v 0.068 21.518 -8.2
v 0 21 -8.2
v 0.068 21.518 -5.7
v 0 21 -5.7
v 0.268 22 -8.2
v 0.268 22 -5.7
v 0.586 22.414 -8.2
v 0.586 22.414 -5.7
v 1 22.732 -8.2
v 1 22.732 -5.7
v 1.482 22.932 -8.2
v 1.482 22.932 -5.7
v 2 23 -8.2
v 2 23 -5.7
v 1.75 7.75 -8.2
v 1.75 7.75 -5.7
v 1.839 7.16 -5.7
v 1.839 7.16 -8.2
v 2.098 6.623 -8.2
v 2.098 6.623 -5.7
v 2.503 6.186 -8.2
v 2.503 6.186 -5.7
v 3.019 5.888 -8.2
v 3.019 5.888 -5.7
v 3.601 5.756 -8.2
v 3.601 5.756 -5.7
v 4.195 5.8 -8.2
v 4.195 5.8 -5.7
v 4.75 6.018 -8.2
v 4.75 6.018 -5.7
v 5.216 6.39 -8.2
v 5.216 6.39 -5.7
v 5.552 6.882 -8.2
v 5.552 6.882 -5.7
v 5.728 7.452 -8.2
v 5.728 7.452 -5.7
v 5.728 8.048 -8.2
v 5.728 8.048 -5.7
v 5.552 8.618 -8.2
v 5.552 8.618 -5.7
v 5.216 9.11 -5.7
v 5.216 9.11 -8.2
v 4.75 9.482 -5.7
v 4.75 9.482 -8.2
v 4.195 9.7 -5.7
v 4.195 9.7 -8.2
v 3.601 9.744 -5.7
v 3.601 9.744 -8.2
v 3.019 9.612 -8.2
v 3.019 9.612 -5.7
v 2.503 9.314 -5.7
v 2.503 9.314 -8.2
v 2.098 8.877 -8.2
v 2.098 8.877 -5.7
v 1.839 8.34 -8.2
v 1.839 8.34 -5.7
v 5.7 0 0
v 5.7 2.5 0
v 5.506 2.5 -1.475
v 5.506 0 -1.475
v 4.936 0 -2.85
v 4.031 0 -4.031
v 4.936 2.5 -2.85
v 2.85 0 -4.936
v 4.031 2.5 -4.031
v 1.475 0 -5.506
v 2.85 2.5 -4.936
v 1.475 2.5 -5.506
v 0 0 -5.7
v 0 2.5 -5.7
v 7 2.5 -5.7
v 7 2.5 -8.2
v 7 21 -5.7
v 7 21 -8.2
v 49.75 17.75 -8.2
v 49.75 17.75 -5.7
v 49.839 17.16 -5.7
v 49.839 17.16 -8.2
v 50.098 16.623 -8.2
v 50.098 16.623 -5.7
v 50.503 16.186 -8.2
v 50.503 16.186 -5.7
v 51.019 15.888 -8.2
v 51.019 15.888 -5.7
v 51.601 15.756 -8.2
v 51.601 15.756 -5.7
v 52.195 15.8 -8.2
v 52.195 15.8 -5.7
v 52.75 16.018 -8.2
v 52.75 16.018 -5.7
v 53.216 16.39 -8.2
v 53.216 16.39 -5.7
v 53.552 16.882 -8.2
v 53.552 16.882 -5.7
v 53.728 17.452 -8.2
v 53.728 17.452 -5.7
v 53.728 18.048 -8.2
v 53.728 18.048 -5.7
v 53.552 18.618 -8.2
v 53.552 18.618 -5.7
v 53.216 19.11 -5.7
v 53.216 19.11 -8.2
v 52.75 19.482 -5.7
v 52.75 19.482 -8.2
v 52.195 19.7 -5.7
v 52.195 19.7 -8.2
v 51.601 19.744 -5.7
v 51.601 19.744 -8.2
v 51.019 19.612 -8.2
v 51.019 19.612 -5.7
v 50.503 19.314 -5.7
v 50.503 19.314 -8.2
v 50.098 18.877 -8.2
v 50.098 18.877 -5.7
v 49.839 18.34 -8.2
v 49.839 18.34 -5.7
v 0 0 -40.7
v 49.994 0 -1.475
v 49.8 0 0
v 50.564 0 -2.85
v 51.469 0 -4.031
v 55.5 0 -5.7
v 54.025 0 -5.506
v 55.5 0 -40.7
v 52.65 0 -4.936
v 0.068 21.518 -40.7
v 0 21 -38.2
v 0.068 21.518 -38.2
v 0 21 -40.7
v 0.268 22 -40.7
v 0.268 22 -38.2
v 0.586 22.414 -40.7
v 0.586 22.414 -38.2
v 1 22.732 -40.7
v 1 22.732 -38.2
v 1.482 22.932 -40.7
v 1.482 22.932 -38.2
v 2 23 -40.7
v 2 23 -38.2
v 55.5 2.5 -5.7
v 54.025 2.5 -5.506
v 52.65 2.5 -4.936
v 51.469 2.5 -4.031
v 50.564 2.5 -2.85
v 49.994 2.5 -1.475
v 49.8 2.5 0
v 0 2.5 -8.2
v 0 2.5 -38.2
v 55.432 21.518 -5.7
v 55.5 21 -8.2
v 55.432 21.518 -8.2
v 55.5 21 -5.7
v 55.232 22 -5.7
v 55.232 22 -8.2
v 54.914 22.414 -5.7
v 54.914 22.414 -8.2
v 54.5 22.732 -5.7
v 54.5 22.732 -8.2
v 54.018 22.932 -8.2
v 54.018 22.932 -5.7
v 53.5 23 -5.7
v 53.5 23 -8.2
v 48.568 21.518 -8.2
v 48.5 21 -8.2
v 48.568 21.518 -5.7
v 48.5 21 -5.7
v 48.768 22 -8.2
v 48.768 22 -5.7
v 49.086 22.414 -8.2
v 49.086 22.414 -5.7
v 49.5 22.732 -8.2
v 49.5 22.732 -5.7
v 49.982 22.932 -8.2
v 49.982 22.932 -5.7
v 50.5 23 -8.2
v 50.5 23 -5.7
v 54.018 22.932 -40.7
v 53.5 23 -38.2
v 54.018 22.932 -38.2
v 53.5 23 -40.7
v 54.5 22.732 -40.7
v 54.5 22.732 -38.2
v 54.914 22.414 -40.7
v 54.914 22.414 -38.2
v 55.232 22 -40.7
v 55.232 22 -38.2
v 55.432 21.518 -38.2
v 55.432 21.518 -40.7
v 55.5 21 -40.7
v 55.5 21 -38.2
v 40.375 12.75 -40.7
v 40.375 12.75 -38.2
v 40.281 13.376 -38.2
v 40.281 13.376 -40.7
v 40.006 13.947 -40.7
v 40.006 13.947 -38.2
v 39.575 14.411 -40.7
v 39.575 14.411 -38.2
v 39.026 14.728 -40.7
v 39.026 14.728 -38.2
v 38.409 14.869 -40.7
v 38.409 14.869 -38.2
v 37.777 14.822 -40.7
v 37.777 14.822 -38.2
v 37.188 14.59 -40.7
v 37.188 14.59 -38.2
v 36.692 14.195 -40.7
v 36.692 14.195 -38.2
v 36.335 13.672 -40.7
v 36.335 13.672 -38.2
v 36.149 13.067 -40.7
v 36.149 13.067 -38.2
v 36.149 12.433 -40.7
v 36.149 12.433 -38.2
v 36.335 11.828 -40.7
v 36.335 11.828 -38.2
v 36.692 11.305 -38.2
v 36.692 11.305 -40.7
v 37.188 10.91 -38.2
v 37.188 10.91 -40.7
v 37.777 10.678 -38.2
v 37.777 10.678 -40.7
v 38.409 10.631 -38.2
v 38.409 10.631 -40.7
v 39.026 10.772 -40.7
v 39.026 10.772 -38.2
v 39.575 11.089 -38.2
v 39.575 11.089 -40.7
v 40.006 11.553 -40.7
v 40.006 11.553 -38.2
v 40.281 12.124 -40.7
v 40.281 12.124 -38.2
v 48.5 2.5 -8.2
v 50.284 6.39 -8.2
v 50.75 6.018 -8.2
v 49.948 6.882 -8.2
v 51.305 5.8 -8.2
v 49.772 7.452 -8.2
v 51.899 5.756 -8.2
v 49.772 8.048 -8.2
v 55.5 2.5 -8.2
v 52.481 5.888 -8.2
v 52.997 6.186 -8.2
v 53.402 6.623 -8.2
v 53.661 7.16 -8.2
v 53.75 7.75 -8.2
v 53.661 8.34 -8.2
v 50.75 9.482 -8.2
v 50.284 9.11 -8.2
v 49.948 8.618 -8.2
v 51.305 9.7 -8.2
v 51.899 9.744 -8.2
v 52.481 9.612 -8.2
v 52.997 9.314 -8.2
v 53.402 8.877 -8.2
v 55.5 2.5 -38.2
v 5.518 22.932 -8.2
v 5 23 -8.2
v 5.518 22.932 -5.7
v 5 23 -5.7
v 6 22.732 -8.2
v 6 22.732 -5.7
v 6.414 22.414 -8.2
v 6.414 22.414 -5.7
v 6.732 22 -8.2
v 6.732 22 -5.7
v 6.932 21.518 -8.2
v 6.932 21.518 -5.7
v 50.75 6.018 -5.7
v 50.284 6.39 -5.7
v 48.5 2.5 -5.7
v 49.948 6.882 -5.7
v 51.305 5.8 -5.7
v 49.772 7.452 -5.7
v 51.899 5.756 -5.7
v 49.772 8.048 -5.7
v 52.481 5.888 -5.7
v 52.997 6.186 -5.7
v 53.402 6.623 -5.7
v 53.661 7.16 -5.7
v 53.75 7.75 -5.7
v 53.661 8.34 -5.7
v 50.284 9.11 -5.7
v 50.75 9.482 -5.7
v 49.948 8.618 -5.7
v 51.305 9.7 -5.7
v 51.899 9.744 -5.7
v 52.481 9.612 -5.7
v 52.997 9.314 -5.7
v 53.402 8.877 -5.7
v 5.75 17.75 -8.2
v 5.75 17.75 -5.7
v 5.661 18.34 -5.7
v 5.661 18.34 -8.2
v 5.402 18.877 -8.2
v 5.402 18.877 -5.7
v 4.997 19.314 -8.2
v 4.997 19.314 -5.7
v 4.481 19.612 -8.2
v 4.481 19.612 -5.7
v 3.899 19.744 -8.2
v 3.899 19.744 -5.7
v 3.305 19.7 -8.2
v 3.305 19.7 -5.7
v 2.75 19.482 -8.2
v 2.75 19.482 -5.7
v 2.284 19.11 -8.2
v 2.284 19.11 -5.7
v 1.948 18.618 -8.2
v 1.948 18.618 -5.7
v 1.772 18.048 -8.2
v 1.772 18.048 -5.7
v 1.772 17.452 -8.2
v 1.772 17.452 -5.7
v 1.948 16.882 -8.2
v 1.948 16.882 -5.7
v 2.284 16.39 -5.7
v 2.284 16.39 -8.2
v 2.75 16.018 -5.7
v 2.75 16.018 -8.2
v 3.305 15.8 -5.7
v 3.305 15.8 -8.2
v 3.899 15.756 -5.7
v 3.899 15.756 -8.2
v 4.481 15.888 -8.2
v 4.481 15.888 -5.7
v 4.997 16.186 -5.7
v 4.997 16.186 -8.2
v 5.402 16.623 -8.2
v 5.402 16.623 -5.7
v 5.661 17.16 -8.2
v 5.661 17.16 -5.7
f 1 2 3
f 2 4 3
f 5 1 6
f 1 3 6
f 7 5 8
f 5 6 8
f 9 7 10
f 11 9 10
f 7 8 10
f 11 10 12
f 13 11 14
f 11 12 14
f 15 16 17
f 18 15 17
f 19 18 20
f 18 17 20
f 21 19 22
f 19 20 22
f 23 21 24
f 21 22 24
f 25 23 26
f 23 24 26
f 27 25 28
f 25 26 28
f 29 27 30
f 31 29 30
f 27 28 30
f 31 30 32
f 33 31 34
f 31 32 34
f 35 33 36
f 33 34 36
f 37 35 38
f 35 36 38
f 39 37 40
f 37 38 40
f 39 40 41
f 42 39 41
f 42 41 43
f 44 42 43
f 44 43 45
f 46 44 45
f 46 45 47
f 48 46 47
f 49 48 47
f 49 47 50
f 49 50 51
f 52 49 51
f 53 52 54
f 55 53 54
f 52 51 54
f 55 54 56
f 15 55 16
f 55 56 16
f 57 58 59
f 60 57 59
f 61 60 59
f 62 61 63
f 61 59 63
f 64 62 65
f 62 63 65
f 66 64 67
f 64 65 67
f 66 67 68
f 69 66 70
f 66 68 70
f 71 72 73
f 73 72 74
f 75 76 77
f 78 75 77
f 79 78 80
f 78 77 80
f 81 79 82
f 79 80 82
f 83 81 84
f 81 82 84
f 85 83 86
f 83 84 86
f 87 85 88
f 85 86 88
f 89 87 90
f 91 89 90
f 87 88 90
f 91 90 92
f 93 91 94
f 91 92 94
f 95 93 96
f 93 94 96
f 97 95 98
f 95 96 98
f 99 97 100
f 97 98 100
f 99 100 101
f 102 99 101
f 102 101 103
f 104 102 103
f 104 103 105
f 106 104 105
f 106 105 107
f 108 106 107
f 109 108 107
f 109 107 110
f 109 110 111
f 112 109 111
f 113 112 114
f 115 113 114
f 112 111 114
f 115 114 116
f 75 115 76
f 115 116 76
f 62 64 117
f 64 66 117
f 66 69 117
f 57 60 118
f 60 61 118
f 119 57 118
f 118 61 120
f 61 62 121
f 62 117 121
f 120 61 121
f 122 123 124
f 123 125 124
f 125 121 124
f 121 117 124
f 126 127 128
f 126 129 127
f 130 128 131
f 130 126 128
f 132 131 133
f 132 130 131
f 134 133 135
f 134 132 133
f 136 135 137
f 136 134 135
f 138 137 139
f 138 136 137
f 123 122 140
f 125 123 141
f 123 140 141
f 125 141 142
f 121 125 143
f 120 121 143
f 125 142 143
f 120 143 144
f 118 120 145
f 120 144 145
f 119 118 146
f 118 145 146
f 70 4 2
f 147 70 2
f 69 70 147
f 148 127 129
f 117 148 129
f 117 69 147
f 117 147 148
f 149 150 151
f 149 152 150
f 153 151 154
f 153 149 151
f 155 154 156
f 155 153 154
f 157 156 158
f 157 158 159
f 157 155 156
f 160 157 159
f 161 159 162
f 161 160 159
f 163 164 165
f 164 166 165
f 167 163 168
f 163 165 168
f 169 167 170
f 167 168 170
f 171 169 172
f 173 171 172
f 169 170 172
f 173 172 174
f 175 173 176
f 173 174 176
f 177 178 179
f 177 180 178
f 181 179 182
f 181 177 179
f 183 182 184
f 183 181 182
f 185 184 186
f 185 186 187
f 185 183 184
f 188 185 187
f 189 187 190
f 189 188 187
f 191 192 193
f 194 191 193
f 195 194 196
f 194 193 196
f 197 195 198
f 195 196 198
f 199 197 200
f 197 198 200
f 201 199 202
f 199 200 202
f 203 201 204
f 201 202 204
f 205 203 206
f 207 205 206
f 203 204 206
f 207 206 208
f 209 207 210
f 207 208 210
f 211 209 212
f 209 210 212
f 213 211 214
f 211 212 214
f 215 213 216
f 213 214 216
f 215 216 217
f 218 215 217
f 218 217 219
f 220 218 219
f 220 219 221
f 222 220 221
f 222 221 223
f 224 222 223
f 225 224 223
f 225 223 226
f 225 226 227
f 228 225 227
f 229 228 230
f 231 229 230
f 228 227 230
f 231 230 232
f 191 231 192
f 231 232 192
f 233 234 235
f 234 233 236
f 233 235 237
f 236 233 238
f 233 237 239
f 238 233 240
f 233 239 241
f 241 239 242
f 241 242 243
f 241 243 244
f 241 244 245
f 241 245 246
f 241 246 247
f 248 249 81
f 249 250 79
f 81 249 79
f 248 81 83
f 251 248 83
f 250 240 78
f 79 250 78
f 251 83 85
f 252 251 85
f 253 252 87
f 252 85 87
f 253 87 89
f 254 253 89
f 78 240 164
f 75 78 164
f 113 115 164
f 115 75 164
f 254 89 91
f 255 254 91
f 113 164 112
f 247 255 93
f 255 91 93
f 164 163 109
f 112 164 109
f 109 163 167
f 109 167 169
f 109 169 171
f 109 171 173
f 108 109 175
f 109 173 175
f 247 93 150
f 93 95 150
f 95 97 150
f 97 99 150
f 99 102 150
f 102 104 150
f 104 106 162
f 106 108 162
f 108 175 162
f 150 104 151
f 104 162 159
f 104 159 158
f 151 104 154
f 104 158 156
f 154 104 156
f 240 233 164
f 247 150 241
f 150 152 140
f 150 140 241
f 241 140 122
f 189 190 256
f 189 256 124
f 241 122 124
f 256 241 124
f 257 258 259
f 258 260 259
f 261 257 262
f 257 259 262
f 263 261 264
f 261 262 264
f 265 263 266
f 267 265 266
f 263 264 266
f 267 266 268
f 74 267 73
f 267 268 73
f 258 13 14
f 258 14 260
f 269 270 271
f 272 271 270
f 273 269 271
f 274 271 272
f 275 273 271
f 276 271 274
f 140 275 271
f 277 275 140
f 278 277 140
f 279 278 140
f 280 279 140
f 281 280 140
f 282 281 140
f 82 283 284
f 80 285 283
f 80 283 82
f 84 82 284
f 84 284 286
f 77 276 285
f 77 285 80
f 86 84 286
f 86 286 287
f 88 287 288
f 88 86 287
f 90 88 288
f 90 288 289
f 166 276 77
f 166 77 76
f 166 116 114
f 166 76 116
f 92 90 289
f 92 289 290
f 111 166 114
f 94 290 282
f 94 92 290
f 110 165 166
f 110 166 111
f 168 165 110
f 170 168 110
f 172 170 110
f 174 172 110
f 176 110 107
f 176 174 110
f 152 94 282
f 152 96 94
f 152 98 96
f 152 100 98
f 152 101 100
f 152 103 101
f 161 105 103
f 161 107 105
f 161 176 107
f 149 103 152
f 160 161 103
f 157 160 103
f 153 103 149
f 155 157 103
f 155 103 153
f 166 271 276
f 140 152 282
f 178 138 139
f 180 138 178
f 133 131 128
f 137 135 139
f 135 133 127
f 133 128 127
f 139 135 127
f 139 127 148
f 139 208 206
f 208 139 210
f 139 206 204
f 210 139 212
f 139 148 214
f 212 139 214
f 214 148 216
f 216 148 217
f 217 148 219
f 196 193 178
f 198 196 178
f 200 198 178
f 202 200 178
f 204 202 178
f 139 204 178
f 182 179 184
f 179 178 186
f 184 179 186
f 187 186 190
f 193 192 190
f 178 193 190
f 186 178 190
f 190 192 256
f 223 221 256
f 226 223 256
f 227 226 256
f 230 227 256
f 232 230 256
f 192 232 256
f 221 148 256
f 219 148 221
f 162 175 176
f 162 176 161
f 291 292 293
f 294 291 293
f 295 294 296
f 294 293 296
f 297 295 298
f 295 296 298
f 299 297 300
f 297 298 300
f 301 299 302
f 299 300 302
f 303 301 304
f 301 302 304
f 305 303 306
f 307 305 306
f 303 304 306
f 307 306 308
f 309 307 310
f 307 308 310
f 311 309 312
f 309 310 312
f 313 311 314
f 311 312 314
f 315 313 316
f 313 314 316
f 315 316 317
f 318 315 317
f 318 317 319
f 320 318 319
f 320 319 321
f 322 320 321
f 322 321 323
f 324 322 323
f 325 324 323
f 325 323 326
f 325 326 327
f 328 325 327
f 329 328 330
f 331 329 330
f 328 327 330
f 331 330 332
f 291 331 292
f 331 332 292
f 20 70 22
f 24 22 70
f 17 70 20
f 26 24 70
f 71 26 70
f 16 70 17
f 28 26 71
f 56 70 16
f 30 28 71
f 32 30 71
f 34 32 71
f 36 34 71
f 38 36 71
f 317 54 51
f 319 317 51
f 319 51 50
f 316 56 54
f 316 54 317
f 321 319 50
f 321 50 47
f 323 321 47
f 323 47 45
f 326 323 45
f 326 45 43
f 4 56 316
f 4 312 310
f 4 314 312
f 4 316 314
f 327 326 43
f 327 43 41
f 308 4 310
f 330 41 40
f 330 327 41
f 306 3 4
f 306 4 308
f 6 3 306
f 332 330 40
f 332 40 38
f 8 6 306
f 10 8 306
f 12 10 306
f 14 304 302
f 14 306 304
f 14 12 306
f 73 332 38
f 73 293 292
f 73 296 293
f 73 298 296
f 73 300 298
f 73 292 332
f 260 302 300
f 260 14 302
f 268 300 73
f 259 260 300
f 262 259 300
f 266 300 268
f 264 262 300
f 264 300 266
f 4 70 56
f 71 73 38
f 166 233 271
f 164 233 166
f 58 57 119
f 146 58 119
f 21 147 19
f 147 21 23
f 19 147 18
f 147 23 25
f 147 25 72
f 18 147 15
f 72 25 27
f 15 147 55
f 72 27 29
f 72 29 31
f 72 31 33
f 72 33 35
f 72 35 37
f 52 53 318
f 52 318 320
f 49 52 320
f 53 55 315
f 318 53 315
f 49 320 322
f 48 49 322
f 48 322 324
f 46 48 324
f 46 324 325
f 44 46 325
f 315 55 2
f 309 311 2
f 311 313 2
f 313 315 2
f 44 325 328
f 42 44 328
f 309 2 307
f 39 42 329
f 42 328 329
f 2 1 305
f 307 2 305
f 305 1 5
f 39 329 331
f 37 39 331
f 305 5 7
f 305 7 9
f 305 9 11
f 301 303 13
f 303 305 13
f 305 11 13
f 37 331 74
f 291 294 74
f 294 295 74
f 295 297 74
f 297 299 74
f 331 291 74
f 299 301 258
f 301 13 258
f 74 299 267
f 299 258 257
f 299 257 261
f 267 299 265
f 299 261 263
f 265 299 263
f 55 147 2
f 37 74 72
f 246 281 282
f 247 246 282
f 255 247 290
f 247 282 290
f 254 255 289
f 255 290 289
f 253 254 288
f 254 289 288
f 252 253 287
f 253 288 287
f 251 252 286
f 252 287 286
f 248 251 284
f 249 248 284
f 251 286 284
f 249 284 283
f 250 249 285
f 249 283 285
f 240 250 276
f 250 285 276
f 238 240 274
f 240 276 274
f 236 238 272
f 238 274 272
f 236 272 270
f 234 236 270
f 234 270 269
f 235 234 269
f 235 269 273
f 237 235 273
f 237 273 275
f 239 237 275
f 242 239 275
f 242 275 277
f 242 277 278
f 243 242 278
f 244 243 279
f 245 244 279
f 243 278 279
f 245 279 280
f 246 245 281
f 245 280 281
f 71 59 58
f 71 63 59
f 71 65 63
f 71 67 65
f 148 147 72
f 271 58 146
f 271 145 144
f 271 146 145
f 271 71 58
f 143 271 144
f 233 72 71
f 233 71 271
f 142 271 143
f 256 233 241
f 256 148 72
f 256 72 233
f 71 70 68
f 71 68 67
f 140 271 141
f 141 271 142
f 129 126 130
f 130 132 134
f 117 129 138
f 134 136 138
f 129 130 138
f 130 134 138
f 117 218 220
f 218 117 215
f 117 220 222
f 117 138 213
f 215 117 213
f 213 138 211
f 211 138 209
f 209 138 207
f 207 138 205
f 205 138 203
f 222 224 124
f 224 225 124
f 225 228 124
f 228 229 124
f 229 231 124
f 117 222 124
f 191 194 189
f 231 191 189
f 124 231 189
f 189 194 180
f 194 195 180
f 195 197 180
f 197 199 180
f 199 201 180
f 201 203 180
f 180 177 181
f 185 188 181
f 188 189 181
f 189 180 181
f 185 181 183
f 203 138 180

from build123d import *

# Parameters (mm, degrees)
SKETCH1_W                   = 55.5
SKETCH1_H                   = 38.2
BRACKETBASE_DEPTH           = 2.5
SKETCH2_W                   = 7
SKETCH2_H                   = 20.5
SERVOMOUNTINGHOLETABS_DEPTH = 2.5
SKETCH3_R                   = 2
SERVOMOUNTINGHOLES_DEPTH    = 2.5
SKETCH4_W                   = 55.5
SKETCH4_H                   = 2.5
BASEWALL_DEPTH              = 23
SKETCH5_R                   = 2.125
M4MOUNTINGHOLE_DEPTH        = 2.5
SKETCH6_R                   = 5.7
BASETRIM_DEPTH              = 2.5
FILLET1_R                   = 2
SKETCH7_R                   = 2.125
CUT_EXTRUDE1_DEPTH          = 10
BOSS_EXTRUDE1_START         = -2.5
SKETCH8_R                   = 2.125
BOSS_EXTRUDE1_DEPTH         = 2.5


with BuildPart() as part:
    # Sketch1 → bracketBase (new body)
    with BuildSketch(Plane(origin=(0, 0, 0), x_dir=(1, 0, 0), z_dir=(0, 1, 0))):
        with Locations((27.75, 19.1)):
            Rectangle(SKETCH1_W, SKETCH1_H)
    extrude(amount=BRACKETBASE_DEPTH)

    # Sketch2 → servoMountingHoleTabs (add)
    with BuildSketch(Plane.XY.offset(-8.2)):
        with Locations((3.5, 12.75)):
            Rectangle(SKETCH2_W, SKETCH2_H)
        with Locations((52, 12.75)):
            Rectangle(SKETCH2_W, SKETCH2_H)
    extrude(amount=SERVOMOUNTINGHOLETABS_DEPTH)

    # Sketch3 → servoMountingHoles (cut)
    with BuildSketch(Plane.XY.offset(-5.7)):
        with Locations((3.75, 17.75)):
            Circle(SKETCH3_R)
        with Locations(Location((3.75, 7.75, 0), (0, 0, 180))):
            Circle(SKETCH3_R)
        with Locations((51.75, 7.75)):
            Circle(SKETCH3_R)
        with Locations(Location((51.75, 17.75, 0), (0, 0, 180))):
            Circle(SKETCH3_R)
    extrude(amount=-SERVOMOUNTINGHOLES_DEPTH, mode=Mode.SUBTRACT)

    # Sketch4 → baseWall (add)
    with BuildSketch(Plane(origin=(0, 0, 0), x_dir=(1, 0, 0), z_dir=(0, 1, 0))):
        with Locations((27.75, 39.45)):
            Rectangle(SKETCH4_W, SKETCH4_H)
    extrude(amount=BASEWALL_DEPTH)

    # Sketch5 → M4mountingHole (cut)
    with BuildSketch(Plane.XY.offset(-38.2)):
        with Locations((38.25, 12.75)):
            Circle(SKETCH5_R)
    extrude(amount=-M4MOUNTINGHOLE_DEPTH, mode=Mode.SUBTRACT)

    # Sketch6 → baseTrim (cut)
    with BuildSketch(Plane(origin=(0, 2.5, 0), x_dir=(1, 0, 0), z_dir=(0, 1, 0))):
        Circle(SKETCH6_R)
        with Locations((55.5, 0)):
            Circle(SKETCH6_R)
    extrude(amount=-BASETRIM_DEPTH, mode=Mode.SUBTRACT)

    # Fillet1
    fillet1_edges = [part.edges().sort_by_distance(p)[0] for p in [
        (0, 23, -6.95),
        (7, 23, -6.95),
        (55.5, 23, -6.95),
        (48.5, 23, -6.95),
        (55.5, 23, -39.45),
        (0, 23, -39.45),
    ]]
    fillet(fillet1_edges, radius=FILLET1_R)

    # Sketch7 → Cut-Extrude1 (cut)
    with BuildSketch(Plane(origin=(0, 0, -40.7), x_dir=(-1, 0, 0), z_dir=(0, 0, -1))):
        with Locations((-17.25, 12.75)):
            Circle(SKETCH7_R)
    extrude(amount=-CUT_EXTRUDE1_DEPTH, mode=Mode.SUBTRACT)

    # Sketch8 → Boss-Extrude1 (add)
    with BuildSketch(Plane.XY.offset(-38.2).offset(BOSS_EXTRUDE1_START)):
        with Locations((17.25, 12.75)):
            Circle(SKETCH8_R)
    extrude(amount=BOSS_EXTRUDE1_DEPTH)


solid = part.part
